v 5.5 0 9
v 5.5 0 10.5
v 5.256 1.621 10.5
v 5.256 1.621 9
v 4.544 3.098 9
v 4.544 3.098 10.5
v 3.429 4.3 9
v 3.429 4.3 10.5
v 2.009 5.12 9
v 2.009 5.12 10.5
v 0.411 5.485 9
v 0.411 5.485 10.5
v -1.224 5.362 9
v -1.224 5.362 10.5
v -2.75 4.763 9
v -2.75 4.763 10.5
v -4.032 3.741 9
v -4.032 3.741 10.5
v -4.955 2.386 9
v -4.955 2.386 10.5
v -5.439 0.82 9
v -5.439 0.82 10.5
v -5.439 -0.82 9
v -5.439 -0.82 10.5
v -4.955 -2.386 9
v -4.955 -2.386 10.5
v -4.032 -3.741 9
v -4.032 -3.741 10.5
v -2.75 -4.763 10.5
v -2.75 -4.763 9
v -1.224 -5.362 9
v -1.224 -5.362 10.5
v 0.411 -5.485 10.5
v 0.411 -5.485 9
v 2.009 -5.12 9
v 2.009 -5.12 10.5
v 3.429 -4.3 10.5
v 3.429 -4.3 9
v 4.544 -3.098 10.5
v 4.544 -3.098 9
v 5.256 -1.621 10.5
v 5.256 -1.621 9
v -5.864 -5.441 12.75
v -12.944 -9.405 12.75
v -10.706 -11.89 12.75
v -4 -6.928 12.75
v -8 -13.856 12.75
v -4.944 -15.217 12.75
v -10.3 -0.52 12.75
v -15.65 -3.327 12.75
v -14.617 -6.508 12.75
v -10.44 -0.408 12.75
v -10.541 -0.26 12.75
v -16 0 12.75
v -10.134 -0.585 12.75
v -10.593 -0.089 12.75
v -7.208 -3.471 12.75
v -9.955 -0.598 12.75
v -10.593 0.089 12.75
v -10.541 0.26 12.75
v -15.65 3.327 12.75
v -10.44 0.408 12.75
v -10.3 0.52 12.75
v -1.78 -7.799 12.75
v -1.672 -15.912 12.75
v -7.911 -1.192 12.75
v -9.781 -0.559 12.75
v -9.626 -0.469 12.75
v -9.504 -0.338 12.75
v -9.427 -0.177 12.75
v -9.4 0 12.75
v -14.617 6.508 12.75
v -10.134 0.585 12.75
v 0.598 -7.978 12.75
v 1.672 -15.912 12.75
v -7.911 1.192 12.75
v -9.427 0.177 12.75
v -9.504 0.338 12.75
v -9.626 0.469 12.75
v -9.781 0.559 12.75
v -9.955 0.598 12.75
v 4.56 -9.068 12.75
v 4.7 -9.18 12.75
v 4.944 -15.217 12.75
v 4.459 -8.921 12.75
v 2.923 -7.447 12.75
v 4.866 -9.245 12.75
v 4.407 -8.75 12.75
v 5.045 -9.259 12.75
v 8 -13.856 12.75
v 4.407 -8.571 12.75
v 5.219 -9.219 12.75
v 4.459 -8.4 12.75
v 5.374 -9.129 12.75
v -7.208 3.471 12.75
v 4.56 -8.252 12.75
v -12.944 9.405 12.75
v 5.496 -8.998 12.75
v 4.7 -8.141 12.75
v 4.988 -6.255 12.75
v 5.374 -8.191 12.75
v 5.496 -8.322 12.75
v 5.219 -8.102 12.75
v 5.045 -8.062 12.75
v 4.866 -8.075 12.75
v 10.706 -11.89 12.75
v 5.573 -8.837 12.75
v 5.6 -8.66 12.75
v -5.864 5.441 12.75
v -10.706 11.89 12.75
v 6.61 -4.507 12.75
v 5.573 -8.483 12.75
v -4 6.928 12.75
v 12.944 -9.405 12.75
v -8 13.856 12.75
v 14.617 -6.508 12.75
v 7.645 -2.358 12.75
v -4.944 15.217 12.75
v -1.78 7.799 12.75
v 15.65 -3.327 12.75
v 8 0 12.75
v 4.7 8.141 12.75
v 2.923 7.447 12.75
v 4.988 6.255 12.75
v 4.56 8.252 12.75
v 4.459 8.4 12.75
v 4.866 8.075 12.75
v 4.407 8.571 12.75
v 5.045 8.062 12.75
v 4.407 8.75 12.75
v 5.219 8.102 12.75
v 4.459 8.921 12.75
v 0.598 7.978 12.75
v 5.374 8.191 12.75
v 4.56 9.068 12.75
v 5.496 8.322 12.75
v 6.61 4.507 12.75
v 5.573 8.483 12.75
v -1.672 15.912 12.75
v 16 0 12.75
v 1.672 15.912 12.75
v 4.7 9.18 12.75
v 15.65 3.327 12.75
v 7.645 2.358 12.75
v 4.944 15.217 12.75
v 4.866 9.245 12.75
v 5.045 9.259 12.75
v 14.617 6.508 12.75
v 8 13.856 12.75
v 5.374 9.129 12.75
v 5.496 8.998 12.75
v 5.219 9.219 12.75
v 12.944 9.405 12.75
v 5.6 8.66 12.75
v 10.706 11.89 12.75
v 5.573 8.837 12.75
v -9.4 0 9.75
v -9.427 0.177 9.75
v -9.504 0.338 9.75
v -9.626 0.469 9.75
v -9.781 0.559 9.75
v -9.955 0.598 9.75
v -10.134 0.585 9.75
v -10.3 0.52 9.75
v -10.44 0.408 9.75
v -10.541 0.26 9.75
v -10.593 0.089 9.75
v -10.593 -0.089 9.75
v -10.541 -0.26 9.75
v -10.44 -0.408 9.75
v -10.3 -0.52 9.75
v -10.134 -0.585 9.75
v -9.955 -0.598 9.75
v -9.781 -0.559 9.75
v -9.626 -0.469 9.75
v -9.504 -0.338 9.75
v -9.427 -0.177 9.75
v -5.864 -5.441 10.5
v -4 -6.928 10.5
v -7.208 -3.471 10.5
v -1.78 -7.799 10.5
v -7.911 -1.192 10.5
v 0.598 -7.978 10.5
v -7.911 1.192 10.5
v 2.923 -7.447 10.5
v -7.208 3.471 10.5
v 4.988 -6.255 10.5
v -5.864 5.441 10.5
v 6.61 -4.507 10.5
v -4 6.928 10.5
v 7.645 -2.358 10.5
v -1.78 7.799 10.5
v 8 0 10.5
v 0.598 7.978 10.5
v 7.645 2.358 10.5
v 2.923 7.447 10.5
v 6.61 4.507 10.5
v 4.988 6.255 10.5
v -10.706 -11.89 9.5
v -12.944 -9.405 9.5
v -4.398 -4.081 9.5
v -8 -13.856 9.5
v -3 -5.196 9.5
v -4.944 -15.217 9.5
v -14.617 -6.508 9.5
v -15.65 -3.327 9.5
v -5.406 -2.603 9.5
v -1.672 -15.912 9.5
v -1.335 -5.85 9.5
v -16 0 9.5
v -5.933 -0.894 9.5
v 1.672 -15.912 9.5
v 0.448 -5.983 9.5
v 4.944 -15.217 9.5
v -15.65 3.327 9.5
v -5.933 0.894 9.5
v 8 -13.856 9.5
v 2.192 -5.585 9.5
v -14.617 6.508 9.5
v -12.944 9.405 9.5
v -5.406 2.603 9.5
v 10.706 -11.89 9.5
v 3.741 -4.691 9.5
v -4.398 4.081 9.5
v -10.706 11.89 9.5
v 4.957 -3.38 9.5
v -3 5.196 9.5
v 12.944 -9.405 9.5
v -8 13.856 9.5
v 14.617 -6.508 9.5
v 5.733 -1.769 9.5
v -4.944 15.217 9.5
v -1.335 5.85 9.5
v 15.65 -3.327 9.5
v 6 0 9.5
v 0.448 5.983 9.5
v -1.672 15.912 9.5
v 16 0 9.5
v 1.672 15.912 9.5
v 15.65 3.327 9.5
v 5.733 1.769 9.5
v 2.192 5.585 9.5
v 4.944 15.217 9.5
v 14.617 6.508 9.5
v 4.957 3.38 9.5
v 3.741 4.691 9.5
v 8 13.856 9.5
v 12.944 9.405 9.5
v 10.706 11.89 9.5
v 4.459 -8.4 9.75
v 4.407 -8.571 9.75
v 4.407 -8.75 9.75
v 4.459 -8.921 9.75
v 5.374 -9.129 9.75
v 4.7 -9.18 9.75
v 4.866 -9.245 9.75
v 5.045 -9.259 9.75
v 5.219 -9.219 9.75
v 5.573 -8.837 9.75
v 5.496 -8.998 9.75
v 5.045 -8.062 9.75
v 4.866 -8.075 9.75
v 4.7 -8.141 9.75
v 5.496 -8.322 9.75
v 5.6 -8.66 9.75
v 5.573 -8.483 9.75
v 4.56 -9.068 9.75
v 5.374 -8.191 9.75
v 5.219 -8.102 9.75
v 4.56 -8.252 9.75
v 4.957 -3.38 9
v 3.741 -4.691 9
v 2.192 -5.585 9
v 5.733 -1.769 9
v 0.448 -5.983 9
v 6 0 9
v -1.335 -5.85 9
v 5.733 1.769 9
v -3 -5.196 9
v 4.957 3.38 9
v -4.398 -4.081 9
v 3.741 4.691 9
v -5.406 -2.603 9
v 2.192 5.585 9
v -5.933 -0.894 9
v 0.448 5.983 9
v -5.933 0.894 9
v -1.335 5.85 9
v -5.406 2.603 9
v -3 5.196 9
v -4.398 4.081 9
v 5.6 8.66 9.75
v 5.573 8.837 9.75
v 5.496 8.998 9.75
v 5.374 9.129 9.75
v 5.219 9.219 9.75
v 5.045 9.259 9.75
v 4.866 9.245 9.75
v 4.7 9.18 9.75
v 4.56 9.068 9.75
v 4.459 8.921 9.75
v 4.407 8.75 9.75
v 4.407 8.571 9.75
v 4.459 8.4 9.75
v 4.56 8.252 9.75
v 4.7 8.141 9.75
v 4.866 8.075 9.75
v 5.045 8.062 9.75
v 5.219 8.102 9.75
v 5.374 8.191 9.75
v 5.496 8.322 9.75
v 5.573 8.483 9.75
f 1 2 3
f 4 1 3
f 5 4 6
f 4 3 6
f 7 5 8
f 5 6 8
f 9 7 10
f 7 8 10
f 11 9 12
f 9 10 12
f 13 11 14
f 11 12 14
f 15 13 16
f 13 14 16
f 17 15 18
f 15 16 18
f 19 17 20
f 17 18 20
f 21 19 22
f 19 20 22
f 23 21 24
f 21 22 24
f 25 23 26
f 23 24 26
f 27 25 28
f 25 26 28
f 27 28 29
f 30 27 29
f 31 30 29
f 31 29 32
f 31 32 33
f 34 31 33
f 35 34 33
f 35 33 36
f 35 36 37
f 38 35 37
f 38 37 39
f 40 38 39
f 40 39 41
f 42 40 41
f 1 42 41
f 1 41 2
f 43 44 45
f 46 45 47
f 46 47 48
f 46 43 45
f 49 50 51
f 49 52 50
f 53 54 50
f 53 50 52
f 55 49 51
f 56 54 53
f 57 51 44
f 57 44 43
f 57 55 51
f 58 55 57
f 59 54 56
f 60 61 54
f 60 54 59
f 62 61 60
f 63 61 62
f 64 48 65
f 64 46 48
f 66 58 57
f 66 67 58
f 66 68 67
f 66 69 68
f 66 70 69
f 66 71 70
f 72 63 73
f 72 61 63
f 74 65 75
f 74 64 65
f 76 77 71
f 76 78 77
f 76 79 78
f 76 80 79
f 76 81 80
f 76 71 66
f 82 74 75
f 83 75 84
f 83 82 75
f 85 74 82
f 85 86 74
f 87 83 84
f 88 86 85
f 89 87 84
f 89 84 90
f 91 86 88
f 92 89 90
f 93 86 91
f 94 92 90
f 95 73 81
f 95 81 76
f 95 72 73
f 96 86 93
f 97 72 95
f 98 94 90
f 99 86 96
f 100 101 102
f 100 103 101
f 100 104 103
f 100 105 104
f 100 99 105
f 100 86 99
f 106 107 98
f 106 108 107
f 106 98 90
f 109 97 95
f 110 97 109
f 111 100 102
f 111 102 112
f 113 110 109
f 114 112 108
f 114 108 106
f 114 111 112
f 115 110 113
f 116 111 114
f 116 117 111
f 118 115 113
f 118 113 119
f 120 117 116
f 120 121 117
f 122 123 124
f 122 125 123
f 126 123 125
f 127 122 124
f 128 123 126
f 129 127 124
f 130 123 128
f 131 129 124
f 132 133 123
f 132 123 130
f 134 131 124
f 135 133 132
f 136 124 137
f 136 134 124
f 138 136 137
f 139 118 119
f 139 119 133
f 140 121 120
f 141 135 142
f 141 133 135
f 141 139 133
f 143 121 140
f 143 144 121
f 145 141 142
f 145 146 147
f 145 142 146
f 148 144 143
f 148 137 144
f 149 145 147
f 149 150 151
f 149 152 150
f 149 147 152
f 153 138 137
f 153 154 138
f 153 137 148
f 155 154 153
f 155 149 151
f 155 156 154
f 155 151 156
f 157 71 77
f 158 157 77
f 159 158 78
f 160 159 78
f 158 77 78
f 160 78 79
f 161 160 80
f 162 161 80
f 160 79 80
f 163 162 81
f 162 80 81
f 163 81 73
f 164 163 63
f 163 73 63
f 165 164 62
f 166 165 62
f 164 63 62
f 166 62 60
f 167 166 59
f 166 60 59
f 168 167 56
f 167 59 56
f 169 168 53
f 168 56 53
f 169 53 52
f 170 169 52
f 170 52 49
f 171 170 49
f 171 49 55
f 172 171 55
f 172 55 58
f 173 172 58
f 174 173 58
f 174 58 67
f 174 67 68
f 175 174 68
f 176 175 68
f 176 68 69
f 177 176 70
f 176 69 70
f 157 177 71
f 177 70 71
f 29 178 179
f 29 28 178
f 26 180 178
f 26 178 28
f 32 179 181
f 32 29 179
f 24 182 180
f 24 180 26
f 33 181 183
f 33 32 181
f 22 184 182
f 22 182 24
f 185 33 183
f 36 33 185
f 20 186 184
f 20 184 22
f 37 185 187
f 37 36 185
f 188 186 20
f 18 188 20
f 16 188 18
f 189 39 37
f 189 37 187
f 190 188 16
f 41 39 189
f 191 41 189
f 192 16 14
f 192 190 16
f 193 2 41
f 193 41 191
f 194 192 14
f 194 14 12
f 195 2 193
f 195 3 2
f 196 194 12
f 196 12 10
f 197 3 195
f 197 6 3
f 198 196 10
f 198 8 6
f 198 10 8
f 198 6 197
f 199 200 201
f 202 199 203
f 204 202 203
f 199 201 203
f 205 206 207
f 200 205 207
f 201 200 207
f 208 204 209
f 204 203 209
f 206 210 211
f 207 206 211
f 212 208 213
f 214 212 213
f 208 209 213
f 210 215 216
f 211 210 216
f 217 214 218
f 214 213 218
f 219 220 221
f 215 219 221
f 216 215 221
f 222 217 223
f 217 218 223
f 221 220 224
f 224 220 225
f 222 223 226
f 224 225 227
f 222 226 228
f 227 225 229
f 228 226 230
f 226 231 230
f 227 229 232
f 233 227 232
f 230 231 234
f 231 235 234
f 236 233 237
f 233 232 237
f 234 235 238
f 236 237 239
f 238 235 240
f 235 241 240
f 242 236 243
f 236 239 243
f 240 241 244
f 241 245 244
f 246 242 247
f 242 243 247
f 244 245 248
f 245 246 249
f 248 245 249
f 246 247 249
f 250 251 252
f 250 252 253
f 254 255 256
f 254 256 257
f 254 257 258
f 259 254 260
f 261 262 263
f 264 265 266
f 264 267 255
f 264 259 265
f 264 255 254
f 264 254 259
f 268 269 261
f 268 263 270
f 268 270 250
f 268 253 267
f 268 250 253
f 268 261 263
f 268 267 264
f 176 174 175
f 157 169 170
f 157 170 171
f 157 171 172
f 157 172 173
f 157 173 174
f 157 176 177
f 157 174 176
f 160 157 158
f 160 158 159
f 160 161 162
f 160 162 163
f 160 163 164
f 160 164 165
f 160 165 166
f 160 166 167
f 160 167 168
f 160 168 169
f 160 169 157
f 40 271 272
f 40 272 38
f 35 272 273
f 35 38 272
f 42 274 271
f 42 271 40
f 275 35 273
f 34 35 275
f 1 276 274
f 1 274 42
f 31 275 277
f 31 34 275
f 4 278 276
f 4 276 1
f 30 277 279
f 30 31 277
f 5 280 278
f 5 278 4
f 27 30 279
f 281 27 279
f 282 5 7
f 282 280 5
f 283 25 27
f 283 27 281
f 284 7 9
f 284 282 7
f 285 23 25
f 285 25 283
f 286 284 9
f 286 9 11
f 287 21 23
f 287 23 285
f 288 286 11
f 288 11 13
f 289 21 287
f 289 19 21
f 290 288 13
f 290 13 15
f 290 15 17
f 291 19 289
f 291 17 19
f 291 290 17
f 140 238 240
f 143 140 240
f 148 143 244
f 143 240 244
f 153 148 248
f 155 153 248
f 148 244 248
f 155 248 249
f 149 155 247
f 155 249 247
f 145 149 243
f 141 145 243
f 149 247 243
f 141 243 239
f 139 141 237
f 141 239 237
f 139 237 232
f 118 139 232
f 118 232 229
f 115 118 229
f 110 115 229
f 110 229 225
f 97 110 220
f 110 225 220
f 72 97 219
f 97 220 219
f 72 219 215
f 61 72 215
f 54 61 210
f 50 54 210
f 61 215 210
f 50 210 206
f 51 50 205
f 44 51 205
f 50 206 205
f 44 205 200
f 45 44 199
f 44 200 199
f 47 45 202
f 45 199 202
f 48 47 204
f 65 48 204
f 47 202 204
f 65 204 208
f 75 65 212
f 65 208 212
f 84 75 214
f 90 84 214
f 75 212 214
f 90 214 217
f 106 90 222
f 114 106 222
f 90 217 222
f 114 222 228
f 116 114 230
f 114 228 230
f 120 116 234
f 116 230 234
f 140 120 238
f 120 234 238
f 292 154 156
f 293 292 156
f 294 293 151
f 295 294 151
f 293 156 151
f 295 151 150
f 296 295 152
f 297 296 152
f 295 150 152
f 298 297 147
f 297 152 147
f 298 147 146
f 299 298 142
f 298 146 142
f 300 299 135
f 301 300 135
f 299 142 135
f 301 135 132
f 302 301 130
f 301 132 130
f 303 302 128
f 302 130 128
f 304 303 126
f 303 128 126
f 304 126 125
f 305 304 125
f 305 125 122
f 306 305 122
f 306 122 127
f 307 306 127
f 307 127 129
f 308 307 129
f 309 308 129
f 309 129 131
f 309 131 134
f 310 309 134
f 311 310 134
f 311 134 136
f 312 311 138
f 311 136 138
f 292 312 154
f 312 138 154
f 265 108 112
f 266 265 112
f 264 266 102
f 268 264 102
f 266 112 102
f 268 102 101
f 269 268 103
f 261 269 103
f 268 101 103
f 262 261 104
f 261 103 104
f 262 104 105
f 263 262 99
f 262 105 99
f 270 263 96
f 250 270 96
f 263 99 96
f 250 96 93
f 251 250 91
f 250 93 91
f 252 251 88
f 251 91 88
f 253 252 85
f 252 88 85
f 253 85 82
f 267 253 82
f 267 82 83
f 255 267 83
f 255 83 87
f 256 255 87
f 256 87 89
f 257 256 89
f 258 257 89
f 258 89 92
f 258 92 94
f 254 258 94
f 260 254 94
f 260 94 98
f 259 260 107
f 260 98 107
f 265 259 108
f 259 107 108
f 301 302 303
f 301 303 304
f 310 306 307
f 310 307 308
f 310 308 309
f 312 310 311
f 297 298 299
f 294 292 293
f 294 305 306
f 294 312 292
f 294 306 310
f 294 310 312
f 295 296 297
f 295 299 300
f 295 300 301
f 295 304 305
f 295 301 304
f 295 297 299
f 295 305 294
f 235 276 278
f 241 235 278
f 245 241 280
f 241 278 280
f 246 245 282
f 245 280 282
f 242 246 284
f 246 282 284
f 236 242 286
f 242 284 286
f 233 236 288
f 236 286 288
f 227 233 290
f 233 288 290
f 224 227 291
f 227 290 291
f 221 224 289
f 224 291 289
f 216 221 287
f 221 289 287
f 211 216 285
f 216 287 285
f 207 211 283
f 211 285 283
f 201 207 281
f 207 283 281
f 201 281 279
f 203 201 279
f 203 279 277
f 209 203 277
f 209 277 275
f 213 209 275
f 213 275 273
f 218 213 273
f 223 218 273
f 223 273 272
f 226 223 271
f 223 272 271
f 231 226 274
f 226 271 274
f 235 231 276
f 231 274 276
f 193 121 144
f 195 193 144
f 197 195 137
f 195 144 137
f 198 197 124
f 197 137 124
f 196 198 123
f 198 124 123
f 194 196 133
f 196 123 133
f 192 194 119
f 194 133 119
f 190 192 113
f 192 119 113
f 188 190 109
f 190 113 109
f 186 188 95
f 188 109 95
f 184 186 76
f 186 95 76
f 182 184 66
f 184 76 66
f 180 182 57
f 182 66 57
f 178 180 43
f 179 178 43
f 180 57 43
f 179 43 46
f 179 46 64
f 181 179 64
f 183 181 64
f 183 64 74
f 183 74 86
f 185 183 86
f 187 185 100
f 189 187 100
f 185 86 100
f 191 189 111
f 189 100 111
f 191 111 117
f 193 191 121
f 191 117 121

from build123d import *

# Parameters (mm, degrees)
SKETCH_1_R          = 16
EXTRUDE_1_DEPTH     = 9
SKETCH_2_R          = 6
EXTRUDE_2_DEPTH     = 0.5
SKETCH_3_R          = 16
EXTRUDE_3_DEPTH     = 3.25
SKETCH_4_R          = 5.5
EXTRUDE_4_DEPTH     = 2.25
SKETCH_5_R          = 3
CUT_EXTRUDE_1_DEPTH = 26.25
SKETCH_6_R          = 8
SKETCH_6_R_2        = 5.5
CUT_EXTRUDE_2_DEPTH = 2.25
SKETCH_7_R          = 0.6
CUT_EXTRUDE_3_DEPTH = 6
SKETCH_8_R          = 0.6
CUT_EXTRUDE_4_DEPTH = 3
SKETCH_9_R          = 28.808997231
CUT_EXTRUDE_5_DEPTH = 9
SKETCH_10_R         = 5.5
CUT_EXTRUDE_6_DEPTH = 9


with BuildPart() as part:
    # 草图1 → 凸台-拉伸1 (new body)
    with BuildSketch(Plane.XY):
        Circle(SKETCH_1_R)
    extrude(amount=EXTRUDE_1_DEPTH)

    # 草图2 → 凸台-拉伸2 (add)
    with BuildSketch(Plane.XY.offset(9)):
        Circle(SKETCH_2_R)
    extrude(amount=EXTRUDE_2_DEPTH)

    # 草图3 → 凸台-拉伸3 (add)
    with BuildSketch(Plane.XY.offset(9.5)):
        Circle(SKETCH_3_R)
    extrude(amount=EXTRUDE_3_DEPTH)

    # 草图4 → 凸台-拉伸4 (add)
    with BuildSketch(Plane.XY.offset(12.75)):
        Circle(SKETCH_4_R)
    extrude(amount=EXTRUDE_4_DEPTH)

    # 草图5 → 切除-拉伸1 (cut)
    with BuildSketch(Plane.XY.offset(15)):
        Circle(SKETCH_5_R)
    extrude(amount=-CUT_EXTRUDE_1_DEPTH, mode=Mode.SUBTRACT)

    # 草图6 → 切除-拉伸2 (cut)
    with BuildSketch(Plane.XY.offset(12.75)):
        Circle(SKETCH_6_R)
        Circle(SKETCH_6_R_2, mode=Mode.SUBTRACT)
    extrude(amount=-CUT_EXTRUDE_2_DEPTH, mode=Mode.SUBTRACT)

    # 草图7 → 切除-拉伸3 (cut)
    with BuildSketch(Plane(origin=(0, 0, 0), x_dir=(-1, 0, 0), z_dir=(0, 0, -1))):
        with Locations((8.660254038, 5)):
            Circle(SKETCH_7_R)
        with Locations((-8.660254038, 5)):
            Circle(SKETCH_7_R)
        with Locations((0, -10)):
            Circle(SKETCH_7_R)
    extrude(amount=-CUT_EXTRUDE_3_DEPTH, mode=Mode.SUBTRACT)

    # 草图8 → 切除-拉伸4 (cut)
    with BuildSketch(Plane.XY.offset(12.75)):
        with Locations((5, -8.660254038)):
            Circle(SKETCH_8_R)
        with Locations((5, 8.660254038)):
            Circle(SKETCH_8_R)
        with Locations((-10, 0)):
            Circle(SKETCH_8_R)
    extrude(amount=-CUT_EXTRUDE_4_DEPTH, mode=Mode.SUBTRACT)

    # 草图9 → 切除-拉伸5 (cut)
    with BuildSketch(Plane(origin=(0, 0, 0), x_dir=(-1, 0, 0), z_dir=(0, 0, -1))):
        Circle(SKETCH_9_R)
    extrude(amount=-CUT_EXTRUDE_5_DEPTH, mode=Mode.SUBTRACT)

    # 草图10 → 切除-拉伸6 (cut)
    with BuildSketch(Plane.XY.offset(15)):
        Circle(SKETCH_10_R)
    extrude(amount=-CUT_EXTRUDE_6_DEPTH, mode=Mode.SUBTRACT)


solid = part.part
